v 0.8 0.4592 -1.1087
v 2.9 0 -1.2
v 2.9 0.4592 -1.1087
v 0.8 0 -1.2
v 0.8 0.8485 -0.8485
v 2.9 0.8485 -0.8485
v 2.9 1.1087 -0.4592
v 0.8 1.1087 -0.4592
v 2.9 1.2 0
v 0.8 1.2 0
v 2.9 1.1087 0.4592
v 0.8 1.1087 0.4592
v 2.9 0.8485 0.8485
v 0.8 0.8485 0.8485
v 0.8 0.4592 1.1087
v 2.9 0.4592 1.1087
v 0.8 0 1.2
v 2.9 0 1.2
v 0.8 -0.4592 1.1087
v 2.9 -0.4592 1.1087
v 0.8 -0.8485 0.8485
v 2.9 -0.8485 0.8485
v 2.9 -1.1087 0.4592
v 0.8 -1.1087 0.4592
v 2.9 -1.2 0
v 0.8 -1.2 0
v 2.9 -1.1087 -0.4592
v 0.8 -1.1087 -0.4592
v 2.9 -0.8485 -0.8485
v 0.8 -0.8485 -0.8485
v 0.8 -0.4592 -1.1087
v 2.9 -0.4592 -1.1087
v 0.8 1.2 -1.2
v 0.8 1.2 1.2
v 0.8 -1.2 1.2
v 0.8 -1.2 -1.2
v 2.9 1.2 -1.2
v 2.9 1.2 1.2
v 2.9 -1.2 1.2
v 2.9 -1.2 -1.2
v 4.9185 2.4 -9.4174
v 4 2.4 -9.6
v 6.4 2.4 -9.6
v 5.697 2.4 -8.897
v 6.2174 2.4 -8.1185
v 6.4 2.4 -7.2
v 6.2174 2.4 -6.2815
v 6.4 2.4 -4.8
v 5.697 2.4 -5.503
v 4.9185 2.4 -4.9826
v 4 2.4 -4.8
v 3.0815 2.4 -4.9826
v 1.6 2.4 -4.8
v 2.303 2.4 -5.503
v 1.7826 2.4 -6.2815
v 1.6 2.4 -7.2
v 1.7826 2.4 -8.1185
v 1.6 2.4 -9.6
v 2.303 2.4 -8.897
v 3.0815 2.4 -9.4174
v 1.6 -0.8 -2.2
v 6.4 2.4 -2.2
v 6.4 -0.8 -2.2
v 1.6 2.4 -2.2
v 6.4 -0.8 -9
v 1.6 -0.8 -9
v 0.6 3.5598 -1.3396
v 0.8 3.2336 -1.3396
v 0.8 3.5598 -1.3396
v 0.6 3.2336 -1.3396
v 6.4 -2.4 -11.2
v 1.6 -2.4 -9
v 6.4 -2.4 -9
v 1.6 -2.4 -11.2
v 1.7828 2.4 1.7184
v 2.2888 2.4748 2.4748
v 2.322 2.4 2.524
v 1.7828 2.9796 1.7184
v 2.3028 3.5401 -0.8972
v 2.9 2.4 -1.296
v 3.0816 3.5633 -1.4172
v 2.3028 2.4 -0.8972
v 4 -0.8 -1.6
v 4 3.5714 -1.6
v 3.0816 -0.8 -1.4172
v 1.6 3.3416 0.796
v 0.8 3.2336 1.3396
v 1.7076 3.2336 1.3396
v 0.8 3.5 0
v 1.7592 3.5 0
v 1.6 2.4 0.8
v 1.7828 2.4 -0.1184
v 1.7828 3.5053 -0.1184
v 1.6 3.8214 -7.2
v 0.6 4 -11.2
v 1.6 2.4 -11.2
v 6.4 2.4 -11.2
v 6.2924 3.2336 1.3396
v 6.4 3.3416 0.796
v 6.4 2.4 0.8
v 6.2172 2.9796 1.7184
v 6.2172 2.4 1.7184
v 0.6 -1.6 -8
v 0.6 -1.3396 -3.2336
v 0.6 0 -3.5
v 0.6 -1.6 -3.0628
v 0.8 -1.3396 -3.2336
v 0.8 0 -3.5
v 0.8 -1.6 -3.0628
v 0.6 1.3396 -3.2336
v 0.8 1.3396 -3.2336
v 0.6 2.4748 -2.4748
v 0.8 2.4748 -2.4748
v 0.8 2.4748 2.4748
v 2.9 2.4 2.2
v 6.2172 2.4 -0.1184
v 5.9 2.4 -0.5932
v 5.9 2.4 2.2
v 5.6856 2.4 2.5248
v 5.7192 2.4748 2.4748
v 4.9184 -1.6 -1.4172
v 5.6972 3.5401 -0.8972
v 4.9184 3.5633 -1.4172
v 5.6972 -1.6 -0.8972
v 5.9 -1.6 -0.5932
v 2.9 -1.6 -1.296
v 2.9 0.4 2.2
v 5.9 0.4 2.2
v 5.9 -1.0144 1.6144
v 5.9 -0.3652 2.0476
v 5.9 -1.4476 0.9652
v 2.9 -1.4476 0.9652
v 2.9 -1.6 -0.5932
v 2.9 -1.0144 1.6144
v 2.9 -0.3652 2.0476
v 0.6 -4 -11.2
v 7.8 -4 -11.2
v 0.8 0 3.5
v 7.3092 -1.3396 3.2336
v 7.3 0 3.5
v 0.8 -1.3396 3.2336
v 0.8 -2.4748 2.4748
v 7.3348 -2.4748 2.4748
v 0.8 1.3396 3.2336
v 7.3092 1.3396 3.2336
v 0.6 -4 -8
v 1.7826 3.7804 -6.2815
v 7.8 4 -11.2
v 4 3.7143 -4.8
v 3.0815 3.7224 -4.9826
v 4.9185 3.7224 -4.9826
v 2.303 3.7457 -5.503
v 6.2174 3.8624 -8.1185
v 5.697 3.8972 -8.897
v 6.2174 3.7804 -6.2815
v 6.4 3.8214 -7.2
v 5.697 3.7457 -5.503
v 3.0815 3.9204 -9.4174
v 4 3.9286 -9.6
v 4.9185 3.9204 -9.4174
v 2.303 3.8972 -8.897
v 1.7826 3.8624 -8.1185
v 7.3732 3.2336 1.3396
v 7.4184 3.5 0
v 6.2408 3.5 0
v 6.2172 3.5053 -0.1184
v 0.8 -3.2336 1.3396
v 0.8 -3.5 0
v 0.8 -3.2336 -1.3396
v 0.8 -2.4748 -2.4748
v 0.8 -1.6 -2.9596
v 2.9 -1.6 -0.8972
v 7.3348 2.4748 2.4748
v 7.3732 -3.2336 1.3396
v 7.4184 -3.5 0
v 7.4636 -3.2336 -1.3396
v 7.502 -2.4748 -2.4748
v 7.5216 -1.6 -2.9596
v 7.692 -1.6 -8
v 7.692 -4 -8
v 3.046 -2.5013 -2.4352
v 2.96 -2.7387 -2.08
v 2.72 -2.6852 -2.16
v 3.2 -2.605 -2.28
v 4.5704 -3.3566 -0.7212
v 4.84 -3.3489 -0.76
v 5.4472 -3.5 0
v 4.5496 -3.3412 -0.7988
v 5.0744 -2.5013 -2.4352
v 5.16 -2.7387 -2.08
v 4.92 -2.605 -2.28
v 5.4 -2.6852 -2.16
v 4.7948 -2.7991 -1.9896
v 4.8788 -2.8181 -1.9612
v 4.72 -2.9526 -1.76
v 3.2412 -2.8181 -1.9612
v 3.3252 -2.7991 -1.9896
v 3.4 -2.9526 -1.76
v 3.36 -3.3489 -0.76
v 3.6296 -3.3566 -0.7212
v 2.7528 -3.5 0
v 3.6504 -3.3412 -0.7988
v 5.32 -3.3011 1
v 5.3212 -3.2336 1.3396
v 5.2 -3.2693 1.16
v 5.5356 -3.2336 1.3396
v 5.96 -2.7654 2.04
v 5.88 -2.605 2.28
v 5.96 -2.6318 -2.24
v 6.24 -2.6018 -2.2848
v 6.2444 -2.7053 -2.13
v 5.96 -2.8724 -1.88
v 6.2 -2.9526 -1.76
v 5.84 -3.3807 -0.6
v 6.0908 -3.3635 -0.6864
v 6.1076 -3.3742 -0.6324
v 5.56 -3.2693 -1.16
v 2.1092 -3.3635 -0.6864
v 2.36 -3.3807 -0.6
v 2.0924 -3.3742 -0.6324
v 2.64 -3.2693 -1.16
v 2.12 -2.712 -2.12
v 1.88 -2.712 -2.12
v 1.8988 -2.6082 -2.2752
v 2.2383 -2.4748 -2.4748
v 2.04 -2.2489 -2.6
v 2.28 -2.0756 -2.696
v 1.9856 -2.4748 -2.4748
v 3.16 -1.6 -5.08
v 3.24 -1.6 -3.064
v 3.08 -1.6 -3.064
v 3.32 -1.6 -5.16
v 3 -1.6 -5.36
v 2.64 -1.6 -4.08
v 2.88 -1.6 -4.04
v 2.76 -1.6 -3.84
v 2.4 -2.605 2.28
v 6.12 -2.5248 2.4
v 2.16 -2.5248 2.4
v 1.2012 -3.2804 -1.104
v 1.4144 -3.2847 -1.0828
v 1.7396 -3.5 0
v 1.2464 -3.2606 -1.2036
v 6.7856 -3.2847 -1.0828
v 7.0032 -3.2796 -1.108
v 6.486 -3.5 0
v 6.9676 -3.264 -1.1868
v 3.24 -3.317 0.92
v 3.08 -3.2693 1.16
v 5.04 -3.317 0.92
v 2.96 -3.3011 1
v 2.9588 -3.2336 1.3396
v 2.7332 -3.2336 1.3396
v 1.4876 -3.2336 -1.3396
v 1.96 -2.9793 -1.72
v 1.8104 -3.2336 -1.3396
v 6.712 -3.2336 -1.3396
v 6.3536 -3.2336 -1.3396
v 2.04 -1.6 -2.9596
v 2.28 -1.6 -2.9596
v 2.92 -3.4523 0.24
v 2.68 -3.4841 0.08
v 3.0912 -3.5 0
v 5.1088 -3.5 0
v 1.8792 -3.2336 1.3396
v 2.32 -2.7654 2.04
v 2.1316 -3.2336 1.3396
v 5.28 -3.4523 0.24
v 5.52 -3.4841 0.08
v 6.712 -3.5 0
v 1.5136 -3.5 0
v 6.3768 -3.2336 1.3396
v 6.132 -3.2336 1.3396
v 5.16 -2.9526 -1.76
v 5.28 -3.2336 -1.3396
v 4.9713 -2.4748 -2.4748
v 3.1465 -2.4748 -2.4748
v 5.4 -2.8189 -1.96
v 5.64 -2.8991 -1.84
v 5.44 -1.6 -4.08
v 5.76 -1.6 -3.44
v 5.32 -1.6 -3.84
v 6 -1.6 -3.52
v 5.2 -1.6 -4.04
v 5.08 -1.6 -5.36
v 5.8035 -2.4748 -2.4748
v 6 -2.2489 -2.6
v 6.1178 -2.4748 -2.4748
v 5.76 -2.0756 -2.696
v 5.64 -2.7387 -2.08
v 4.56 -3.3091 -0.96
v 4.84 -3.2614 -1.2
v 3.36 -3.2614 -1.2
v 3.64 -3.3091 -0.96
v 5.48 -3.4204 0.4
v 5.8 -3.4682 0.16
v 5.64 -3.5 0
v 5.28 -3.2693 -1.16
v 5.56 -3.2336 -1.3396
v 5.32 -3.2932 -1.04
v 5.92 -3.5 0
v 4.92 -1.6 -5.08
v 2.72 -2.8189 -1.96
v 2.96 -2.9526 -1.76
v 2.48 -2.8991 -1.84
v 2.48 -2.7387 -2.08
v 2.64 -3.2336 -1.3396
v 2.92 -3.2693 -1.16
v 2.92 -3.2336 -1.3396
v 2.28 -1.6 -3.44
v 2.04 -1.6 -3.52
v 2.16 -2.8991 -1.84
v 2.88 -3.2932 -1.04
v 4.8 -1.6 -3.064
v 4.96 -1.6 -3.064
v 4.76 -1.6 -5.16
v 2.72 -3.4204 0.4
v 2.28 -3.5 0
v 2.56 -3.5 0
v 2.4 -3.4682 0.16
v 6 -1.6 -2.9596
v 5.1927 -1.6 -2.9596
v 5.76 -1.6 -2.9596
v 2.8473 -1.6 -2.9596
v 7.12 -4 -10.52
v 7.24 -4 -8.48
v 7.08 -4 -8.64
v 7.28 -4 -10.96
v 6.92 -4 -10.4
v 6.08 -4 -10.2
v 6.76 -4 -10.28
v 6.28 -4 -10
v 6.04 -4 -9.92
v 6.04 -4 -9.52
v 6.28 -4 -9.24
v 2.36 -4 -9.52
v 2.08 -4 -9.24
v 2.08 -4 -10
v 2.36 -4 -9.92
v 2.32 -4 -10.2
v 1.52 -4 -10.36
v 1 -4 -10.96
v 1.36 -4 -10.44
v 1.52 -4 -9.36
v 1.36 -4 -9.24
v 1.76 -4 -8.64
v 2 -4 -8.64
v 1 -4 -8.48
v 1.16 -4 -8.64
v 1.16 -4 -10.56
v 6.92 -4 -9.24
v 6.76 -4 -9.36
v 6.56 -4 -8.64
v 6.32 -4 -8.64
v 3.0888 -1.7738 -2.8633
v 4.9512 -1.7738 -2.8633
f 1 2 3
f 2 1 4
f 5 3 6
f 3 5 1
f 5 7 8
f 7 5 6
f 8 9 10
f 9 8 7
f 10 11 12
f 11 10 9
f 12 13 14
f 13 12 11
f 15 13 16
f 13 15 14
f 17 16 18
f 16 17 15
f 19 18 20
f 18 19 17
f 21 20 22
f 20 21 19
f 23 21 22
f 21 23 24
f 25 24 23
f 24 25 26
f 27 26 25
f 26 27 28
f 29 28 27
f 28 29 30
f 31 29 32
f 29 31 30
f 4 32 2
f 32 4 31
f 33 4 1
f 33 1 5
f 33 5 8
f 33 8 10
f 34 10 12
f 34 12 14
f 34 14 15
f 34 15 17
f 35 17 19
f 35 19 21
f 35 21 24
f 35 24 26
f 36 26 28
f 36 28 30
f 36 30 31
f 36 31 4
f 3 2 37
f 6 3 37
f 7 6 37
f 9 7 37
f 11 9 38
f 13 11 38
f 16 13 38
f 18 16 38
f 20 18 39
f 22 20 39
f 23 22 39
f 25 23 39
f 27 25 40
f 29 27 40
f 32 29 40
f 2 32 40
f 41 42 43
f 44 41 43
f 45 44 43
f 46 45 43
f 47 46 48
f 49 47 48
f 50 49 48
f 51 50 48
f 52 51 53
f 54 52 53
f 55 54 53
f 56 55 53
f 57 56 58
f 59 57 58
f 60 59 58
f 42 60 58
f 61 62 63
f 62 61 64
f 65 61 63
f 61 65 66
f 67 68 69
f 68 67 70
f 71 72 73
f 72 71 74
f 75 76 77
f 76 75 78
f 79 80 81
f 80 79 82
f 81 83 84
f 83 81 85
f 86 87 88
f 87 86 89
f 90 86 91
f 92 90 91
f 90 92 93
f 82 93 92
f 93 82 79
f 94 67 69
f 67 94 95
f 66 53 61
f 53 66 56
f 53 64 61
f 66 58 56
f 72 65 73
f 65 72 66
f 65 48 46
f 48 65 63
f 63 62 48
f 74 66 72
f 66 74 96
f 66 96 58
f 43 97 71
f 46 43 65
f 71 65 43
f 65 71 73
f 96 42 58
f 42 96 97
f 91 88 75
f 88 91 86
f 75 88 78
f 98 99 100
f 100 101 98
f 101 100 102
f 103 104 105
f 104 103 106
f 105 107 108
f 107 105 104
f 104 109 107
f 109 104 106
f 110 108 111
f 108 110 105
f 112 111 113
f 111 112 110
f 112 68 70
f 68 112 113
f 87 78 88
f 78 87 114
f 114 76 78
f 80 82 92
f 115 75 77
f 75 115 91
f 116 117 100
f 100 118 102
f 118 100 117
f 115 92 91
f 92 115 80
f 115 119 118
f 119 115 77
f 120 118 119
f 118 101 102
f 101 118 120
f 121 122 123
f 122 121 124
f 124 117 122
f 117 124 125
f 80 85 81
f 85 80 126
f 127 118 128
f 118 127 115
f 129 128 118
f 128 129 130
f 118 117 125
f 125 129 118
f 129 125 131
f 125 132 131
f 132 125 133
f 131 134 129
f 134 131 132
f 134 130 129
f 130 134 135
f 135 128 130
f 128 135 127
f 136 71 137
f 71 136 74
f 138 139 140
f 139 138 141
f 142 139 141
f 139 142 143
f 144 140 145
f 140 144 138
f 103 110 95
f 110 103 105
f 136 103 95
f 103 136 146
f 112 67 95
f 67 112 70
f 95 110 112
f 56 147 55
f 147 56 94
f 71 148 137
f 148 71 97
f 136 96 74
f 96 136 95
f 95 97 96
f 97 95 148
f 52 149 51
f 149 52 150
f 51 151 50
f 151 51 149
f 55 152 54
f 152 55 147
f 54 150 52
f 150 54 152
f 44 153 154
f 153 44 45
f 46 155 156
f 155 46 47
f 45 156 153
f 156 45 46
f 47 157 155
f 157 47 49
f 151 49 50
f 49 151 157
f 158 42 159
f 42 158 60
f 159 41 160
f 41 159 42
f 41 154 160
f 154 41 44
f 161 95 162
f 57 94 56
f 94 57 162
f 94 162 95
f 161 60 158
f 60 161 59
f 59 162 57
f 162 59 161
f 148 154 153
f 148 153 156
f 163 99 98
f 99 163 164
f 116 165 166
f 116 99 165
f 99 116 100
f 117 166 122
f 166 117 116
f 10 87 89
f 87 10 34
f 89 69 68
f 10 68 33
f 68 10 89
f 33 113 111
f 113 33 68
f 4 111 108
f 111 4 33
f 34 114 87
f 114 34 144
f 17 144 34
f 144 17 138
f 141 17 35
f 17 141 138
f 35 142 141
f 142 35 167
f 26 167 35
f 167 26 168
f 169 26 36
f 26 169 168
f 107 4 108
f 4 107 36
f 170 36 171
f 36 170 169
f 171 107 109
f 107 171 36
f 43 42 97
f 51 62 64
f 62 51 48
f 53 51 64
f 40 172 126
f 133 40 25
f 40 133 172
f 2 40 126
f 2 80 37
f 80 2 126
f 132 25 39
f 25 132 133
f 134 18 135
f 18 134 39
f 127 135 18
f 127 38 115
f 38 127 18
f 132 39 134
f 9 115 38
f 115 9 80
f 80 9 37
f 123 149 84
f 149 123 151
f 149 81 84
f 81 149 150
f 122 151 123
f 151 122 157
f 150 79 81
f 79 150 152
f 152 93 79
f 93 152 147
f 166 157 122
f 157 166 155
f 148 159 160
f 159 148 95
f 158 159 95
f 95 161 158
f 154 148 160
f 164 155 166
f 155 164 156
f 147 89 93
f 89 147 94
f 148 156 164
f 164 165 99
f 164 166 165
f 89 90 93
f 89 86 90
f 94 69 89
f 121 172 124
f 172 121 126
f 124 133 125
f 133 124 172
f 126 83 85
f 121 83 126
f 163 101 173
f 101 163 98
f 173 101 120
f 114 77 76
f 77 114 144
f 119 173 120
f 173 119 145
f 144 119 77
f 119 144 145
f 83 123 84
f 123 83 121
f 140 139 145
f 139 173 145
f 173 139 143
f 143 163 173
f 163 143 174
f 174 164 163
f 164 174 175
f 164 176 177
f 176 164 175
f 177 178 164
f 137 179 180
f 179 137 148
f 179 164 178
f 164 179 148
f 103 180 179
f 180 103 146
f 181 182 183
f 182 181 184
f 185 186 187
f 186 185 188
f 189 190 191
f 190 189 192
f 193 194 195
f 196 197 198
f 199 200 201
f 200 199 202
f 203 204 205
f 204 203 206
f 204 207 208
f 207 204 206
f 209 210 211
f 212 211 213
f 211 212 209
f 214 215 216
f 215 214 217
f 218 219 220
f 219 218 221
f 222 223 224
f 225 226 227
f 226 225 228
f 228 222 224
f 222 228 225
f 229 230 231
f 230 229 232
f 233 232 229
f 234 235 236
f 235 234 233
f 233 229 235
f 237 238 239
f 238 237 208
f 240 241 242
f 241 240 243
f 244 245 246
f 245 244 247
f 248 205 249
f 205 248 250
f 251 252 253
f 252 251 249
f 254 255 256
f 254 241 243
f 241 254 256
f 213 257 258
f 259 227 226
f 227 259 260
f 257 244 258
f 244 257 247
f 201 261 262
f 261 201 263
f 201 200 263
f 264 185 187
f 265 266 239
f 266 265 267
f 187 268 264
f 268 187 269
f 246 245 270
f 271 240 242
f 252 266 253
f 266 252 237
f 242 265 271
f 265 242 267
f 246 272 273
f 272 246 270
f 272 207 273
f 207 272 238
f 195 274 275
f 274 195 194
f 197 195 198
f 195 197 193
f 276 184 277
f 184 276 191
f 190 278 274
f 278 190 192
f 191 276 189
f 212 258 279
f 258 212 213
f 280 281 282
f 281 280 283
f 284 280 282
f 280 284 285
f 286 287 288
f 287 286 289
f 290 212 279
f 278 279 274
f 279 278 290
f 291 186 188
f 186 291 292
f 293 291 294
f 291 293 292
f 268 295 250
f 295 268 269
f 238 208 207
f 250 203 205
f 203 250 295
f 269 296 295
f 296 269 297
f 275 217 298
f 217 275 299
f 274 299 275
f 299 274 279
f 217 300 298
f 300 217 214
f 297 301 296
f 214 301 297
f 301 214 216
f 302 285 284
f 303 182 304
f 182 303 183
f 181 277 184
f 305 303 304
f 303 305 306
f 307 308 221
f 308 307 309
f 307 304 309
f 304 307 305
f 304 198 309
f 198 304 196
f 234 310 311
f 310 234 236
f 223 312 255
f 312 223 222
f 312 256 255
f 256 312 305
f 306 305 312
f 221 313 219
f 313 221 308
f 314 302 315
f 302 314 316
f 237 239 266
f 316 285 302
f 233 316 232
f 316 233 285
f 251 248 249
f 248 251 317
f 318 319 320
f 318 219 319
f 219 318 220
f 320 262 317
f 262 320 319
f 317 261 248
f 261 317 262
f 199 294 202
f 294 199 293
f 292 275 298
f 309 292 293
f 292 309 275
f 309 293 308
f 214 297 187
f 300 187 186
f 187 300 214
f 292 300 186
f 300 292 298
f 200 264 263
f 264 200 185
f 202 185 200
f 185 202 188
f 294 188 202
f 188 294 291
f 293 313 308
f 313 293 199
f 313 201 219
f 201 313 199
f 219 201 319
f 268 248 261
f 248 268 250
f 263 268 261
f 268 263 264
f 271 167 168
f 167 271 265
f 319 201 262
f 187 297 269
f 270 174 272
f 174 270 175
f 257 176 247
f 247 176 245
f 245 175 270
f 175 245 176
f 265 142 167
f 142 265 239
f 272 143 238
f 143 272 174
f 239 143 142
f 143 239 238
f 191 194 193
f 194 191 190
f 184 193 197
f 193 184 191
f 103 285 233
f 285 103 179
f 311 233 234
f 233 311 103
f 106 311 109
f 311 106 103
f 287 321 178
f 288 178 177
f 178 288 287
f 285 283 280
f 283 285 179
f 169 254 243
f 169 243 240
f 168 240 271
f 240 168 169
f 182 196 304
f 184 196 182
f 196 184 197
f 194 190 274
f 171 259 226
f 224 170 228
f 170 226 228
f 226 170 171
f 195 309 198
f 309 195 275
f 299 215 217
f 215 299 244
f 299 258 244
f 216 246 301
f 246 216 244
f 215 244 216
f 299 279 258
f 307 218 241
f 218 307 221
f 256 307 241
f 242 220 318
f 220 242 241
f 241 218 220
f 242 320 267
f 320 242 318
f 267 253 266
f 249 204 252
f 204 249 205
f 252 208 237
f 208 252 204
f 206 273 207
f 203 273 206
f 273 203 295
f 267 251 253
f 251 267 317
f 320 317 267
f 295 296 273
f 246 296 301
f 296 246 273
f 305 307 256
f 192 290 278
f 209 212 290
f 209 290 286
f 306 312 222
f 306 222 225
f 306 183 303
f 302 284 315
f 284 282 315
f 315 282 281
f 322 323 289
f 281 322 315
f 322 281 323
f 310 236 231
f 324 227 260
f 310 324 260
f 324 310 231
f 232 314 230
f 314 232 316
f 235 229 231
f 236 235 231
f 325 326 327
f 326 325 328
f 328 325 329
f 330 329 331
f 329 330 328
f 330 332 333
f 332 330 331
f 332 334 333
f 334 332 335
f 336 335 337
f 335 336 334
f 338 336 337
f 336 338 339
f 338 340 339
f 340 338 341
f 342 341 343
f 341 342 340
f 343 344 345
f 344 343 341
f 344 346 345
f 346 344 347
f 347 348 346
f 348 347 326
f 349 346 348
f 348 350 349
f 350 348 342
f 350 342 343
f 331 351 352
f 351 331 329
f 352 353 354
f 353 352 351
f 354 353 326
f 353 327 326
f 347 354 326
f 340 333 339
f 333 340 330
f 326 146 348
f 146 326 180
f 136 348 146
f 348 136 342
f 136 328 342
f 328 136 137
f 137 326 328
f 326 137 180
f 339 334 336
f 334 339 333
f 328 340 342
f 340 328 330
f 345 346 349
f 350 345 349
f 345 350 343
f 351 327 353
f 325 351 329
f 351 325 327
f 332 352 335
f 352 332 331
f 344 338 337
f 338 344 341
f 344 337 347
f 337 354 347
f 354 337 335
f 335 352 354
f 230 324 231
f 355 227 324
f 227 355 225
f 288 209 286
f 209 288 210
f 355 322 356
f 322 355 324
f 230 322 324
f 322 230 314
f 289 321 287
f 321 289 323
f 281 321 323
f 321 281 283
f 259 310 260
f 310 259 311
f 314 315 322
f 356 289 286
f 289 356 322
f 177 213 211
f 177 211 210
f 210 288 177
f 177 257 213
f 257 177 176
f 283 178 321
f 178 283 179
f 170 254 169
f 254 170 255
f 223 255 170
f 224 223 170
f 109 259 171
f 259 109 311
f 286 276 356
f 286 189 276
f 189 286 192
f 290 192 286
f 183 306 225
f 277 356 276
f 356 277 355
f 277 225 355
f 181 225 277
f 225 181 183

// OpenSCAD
use <../lib.scad>
use <3816bpbe.scad>
function ldraw_lib__3817bpbe() = [
// 0 ~Minifig Leg Left with Iron Man Armoured Suit Mark XVII Pattern (Obsolete)
// 0 Name: 3817bpbe.dat
// 0 Author: Magnus Forsberg [MagFors]
// 0 !LDRAW_ORG Part UPDATE 2023-03
// 0 !LICENSE Licensed under CC BY 4.0 : see CAreadme.txt
// 
// 0 BFC CERTIFY CCW
  [0,"BFC","CERTIFY"],
  [0,"BFC","CCW"],
// 
// 0 !CATEGORY Obsolete
// 0 !KEYWORDS bricklink 970c00pb0235, Heartbreaker, set 76008
// 
// 0 !CMDLINE -c320
// 
// 0 !HISTORY 2013-12-23 [MagFors] Original design as 3815cbe
// 0 !HISTORY 2020-06-18 [MagFors] Adapted to corrected geometry
// 0 !HISTORY 2020-12-29 [PTadmin] Official Update 2020-03
// 0 !HISTORY 2023-06-02 [Holly-Wood] Obsoleted due to bad geometry
// 0 !HISTORY 2023-06-24 [OrionP] Official Update 2023-03
// 
// 
// 1 16 0 0 0 -1 0 0 0 1 0 0 0 1 3816bpbe.dat
  [1,16,0,0,0,-1,0,0,0,1,0,0,0,1, ldraw_lib__3816bpbe()],
];
module ldraw_lib__3817bpbe(step=0, col=false, unit=2/5, alt=false, line=0.2, solid=!$preview)
    makepoly(ldraw_lib__3817bpbe(), step=step, col=col, unit=unit, alt=alt, line=line, solid=solid);
ldraw_lib__3817bpbe(line=0.2);
